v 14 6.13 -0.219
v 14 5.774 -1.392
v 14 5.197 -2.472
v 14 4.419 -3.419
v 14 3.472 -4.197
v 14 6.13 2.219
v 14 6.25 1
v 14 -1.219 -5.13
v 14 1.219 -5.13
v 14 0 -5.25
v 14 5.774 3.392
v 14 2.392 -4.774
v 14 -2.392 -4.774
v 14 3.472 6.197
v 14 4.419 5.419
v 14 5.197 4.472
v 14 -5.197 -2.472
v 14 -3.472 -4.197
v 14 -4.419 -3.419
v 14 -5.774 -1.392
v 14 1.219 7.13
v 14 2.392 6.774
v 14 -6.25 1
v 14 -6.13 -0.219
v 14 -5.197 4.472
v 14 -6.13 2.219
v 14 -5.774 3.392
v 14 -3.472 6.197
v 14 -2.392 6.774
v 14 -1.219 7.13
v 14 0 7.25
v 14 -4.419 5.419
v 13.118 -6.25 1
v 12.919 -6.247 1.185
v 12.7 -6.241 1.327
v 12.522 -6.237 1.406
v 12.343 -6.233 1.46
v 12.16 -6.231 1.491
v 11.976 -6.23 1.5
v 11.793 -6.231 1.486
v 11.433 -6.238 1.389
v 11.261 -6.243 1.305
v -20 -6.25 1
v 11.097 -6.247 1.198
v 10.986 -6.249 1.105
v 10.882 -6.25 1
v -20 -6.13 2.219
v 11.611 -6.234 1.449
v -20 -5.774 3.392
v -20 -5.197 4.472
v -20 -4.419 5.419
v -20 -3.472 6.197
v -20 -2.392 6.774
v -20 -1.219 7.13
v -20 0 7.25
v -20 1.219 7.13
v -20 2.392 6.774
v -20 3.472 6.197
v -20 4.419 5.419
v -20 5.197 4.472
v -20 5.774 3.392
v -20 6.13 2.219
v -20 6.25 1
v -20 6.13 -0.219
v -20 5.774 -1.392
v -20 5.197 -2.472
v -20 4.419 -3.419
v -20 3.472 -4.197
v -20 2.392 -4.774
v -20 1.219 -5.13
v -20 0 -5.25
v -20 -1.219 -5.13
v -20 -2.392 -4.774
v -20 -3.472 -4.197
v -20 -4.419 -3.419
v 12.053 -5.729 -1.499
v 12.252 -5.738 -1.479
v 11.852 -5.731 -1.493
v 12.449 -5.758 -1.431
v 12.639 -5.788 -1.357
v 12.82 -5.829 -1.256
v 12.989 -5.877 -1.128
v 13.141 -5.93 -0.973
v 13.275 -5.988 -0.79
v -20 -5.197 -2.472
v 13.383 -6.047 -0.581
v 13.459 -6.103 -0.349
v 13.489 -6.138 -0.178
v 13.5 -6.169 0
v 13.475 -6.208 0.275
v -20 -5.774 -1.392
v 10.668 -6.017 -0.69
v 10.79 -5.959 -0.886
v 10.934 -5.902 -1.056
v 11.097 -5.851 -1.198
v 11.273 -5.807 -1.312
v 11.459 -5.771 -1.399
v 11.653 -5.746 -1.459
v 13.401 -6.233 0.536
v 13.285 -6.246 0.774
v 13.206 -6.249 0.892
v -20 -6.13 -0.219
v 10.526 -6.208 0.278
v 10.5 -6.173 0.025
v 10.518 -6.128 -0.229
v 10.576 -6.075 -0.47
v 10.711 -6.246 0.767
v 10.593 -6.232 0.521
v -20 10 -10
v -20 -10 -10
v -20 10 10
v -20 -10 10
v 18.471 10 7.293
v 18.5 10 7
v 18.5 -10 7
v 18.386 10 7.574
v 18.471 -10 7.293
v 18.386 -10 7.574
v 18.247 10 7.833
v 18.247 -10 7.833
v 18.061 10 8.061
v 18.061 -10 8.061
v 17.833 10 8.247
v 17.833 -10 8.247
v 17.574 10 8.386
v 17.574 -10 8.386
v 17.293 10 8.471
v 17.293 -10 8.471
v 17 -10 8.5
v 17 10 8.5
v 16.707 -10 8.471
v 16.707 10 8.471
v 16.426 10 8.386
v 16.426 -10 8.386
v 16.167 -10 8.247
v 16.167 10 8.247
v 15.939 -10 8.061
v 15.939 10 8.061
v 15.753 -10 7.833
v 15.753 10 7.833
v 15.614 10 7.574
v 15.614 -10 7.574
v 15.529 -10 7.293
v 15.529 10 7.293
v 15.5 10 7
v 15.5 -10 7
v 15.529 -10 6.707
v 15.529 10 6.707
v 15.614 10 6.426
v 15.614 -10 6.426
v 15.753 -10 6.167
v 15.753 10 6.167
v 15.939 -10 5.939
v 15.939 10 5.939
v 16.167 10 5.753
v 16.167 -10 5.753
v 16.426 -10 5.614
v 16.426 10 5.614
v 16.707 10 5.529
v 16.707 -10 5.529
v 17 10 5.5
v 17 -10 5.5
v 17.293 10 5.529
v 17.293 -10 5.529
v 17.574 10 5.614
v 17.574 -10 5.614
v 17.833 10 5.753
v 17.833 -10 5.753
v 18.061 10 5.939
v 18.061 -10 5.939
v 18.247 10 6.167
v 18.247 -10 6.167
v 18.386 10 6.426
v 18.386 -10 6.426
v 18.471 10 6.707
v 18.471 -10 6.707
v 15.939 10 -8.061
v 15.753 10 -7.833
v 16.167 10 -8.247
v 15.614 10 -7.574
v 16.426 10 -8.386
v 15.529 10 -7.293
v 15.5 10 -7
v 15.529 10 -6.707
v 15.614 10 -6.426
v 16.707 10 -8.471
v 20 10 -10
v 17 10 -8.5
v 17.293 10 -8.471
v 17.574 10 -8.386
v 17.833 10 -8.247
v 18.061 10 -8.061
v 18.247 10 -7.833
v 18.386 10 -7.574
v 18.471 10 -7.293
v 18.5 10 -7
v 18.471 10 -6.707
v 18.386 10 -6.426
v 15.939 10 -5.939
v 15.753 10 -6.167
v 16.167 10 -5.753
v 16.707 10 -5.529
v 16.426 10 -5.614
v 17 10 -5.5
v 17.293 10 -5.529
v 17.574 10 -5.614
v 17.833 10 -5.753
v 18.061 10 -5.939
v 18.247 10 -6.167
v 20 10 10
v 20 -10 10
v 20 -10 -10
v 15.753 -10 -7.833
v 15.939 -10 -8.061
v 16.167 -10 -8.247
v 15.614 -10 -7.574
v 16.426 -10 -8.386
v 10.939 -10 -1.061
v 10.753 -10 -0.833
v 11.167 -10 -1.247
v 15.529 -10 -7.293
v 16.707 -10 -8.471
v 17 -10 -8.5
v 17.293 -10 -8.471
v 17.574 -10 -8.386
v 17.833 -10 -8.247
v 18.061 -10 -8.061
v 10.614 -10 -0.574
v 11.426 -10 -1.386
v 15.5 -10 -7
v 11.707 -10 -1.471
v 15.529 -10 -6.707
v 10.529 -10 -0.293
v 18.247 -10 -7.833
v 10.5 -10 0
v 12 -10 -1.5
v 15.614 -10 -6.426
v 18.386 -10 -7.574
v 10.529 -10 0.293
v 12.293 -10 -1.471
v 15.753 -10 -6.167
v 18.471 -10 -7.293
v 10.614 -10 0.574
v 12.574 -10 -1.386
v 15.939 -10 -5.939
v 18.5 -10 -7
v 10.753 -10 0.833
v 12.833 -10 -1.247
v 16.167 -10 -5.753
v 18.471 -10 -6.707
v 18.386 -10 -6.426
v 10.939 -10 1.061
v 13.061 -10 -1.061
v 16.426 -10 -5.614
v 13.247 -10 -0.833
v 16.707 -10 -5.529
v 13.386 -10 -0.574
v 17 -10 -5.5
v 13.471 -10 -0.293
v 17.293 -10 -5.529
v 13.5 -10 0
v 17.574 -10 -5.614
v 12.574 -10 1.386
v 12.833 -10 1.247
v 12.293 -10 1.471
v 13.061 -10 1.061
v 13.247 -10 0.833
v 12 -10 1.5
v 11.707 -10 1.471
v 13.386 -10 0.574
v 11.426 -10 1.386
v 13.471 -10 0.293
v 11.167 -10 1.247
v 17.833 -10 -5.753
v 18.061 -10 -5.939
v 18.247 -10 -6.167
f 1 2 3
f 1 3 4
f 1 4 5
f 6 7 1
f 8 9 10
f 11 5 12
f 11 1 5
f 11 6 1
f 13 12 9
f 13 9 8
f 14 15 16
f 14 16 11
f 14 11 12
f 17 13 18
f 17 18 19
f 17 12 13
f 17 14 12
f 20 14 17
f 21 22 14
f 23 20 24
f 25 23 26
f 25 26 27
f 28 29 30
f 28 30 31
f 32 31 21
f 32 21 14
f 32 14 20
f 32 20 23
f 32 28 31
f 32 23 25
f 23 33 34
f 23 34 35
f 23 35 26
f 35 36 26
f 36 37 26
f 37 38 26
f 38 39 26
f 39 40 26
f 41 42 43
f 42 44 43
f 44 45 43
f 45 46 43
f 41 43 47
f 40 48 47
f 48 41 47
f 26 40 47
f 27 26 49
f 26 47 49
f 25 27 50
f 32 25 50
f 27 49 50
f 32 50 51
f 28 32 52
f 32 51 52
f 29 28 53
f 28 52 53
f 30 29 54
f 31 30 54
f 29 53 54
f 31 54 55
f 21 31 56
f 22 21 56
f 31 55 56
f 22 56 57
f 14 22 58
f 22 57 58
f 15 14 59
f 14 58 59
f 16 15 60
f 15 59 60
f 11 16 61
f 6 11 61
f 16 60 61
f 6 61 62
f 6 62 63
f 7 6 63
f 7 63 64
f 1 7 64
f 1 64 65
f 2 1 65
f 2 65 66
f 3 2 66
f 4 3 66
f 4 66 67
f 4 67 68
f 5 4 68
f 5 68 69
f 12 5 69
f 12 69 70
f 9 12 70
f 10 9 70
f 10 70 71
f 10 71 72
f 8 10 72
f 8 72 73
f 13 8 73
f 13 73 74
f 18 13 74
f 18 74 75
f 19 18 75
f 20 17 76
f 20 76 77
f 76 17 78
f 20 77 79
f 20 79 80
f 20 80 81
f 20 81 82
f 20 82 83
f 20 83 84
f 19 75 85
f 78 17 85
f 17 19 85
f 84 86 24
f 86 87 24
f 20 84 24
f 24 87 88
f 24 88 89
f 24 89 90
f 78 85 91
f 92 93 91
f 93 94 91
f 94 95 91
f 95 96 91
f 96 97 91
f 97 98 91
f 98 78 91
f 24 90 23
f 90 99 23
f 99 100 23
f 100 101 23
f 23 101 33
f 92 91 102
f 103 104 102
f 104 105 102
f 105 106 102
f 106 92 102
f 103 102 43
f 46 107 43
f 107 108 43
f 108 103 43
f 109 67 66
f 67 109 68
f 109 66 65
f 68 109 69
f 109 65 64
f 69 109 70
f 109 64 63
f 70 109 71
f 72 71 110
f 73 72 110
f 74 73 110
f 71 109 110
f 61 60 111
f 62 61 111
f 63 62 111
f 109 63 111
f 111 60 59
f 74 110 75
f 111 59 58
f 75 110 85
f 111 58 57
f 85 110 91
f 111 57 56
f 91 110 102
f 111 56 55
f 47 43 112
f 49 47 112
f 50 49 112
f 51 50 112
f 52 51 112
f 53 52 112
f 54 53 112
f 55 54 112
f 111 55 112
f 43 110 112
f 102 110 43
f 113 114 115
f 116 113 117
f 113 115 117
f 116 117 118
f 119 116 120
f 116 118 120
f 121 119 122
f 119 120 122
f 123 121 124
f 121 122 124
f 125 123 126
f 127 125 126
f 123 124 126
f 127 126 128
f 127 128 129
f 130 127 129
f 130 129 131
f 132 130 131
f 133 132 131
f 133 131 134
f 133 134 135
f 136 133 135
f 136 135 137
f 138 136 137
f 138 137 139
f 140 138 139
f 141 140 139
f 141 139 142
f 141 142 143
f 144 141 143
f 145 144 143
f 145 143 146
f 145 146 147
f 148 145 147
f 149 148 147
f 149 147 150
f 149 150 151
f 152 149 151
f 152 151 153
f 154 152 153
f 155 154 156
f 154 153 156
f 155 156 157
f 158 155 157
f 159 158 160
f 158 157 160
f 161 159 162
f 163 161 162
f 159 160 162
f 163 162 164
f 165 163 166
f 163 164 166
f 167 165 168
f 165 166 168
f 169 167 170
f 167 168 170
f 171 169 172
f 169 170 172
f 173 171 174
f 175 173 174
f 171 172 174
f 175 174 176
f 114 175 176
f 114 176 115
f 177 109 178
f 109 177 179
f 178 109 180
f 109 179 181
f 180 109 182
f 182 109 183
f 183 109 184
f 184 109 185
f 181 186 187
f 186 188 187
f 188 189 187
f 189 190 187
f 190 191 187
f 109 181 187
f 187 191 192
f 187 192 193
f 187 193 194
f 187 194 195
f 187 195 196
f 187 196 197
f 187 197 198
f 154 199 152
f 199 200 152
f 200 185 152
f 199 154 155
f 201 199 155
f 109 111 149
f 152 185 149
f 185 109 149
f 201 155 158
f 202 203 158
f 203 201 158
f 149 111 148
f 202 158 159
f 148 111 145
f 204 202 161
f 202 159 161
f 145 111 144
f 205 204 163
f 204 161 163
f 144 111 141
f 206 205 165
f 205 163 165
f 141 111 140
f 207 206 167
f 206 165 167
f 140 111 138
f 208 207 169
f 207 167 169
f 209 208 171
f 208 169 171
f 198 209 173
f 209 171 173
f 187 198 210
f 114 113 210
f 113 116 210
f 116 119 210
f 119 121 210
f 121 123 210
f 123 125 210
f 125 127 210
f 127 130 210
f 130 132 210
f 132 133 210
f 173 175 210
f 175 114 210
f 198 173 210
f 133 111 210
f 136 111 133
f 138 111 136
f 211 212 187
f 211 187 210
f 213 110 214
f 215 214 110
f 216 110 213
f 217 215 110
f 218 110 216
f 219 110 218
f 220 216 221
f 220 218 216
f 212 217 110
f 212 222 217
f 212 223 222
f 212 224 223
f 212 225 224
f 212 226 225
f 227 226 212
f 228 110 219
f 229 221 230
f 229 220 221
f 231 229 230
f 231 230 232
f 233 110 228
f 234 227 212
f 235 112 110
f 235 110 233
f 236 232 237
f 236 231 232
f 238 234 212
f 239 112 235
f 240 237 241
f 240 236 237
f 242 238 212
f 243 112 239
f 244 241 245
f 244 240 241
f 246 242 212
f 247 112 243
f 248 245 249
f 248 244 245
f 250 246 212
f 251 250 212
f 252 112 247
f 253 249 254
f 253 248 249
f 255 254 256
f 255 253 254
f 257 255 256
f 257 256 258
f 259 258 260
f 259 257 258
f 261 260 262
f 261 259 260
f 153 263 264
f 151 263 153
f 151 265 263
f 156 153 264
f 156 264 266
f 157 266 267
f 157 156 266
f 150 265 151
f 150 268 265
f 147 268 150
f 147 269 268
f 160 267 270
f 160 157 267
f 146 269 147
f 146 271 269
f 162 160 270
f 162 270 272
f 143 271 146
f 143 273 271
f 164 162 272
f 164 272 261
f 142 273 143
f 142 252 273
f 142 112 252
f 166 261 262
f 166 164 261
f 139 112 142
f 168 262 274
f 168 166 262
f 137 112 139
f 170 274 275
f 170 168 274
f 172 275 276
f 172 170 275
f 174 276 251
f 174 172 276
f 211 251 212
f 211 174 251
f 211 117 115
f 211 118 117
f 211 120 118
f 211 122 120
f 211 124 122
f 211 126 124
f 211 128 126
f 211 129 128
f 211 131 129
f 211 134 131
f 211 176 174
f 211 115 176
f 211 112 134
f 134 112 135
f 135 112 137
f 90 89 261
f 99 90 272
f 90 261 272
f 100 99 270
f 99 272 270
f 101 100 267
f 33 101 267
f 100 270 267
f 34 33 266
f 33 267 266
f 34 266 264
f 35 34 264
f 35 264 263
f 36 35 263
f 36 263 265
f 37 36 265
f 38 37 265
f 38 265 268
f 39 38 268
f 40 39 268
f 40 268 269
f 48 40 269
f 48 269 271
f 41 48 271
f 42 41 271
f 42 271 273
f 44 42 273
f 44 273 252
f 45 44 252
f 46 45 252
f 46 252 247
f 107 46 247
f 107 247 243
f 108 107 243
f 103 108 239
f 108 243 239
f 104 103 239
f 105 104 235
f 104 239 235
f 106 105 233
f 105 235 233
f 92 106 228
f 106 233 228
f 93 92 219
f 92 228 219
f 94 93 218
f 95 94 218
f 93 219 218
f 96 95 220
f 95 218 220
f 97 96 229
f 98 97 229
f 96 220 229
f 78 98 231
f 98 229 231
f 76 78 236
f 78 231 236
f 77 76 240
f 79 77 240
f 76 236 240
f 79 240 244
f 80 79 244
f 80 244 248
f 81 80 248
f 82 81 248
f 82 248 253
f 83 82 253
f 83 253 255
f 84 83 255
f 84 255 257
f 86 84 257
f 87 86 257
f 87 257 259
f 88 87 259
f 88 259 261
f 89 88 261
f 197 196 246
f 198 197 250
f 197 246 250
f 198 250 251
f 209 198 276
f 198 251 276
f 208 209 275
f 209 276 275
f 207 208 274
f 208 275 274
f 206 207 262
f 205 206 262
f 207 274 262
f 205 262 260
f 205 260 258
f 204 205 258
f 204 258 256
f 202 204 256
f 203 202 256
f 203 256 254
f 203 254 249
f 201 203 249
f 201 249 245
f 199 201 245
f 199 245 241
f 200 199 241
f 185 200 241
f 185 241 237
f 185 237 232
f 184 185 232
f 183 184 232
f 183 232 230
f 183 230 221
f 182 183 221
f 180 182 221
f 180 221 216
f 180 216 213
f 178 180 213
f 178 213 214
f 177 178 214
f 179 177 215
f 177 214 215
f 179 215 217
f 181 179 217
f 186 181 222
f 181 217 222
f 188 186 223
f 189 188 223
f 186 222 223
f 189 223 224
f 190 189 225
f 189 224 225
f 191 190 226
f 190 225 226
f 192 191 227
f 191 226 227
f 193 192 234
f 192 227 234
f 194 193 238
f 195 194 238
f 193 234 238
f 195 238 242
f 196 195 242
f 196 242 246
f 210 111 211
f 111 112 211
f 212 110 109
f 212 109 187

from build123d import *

# Parameters (mm, degrees)
F0_W          = 40
F0_H          = 20
F1_DEPTH      = 10
F1_DEPTH_BACK = 10
F2_R          = 6.25
F3_DEPTH      = 34
F4_R          = 1.5
F5_DEPTH      = 20.001
F6_R          = 1.5
F7_DEPTH      = 4.2727804813


with BuildPart() as f1:
    # F0 (on Front) → F1 (new body, two sides)
    with BuildSketch(Plane.XZ) as f1_sk:
        Rectangle(F0_W, F0_H)
    extrude(amount=F1_DEPTH)
    extrude(f1_sk.sketch, amount=-F1_DEPTH_BACK)

    # F2 (on face) → F3 (cut)
    with BuildSketch(Plane(origin=(-20, 0, 0), x_dir=(0, -1, 0), z_dir=(-1, 0, 0))):
        with Locations((0, 1)):
            Circle(F2_R)
    extrude(amount=-F3_DEPTH, mode=Mode.SUBTRACT)

    # F4 (on face) → F5 (cut, through all)
    with BuildSketch(Plane.XZ.offset(10)):
        with Locations((17, 7)):
            Circle(F4_R)
        with Locations((17, -7)):
            Circle(F4_R)
    extrude(amount=-F5_DEPTH, mode=Mode.SUBTRACT)

    # F6 (on face) → F7 (cut, through all)
    with BuildSketch(Plane.XZ.offset(10)):
        with Locations((12, 0)):
            Circle(F6_R)
    extrude(amount=-F7_DEPTH, mode=Mode.SUBTRACT)


solid = f1.part
